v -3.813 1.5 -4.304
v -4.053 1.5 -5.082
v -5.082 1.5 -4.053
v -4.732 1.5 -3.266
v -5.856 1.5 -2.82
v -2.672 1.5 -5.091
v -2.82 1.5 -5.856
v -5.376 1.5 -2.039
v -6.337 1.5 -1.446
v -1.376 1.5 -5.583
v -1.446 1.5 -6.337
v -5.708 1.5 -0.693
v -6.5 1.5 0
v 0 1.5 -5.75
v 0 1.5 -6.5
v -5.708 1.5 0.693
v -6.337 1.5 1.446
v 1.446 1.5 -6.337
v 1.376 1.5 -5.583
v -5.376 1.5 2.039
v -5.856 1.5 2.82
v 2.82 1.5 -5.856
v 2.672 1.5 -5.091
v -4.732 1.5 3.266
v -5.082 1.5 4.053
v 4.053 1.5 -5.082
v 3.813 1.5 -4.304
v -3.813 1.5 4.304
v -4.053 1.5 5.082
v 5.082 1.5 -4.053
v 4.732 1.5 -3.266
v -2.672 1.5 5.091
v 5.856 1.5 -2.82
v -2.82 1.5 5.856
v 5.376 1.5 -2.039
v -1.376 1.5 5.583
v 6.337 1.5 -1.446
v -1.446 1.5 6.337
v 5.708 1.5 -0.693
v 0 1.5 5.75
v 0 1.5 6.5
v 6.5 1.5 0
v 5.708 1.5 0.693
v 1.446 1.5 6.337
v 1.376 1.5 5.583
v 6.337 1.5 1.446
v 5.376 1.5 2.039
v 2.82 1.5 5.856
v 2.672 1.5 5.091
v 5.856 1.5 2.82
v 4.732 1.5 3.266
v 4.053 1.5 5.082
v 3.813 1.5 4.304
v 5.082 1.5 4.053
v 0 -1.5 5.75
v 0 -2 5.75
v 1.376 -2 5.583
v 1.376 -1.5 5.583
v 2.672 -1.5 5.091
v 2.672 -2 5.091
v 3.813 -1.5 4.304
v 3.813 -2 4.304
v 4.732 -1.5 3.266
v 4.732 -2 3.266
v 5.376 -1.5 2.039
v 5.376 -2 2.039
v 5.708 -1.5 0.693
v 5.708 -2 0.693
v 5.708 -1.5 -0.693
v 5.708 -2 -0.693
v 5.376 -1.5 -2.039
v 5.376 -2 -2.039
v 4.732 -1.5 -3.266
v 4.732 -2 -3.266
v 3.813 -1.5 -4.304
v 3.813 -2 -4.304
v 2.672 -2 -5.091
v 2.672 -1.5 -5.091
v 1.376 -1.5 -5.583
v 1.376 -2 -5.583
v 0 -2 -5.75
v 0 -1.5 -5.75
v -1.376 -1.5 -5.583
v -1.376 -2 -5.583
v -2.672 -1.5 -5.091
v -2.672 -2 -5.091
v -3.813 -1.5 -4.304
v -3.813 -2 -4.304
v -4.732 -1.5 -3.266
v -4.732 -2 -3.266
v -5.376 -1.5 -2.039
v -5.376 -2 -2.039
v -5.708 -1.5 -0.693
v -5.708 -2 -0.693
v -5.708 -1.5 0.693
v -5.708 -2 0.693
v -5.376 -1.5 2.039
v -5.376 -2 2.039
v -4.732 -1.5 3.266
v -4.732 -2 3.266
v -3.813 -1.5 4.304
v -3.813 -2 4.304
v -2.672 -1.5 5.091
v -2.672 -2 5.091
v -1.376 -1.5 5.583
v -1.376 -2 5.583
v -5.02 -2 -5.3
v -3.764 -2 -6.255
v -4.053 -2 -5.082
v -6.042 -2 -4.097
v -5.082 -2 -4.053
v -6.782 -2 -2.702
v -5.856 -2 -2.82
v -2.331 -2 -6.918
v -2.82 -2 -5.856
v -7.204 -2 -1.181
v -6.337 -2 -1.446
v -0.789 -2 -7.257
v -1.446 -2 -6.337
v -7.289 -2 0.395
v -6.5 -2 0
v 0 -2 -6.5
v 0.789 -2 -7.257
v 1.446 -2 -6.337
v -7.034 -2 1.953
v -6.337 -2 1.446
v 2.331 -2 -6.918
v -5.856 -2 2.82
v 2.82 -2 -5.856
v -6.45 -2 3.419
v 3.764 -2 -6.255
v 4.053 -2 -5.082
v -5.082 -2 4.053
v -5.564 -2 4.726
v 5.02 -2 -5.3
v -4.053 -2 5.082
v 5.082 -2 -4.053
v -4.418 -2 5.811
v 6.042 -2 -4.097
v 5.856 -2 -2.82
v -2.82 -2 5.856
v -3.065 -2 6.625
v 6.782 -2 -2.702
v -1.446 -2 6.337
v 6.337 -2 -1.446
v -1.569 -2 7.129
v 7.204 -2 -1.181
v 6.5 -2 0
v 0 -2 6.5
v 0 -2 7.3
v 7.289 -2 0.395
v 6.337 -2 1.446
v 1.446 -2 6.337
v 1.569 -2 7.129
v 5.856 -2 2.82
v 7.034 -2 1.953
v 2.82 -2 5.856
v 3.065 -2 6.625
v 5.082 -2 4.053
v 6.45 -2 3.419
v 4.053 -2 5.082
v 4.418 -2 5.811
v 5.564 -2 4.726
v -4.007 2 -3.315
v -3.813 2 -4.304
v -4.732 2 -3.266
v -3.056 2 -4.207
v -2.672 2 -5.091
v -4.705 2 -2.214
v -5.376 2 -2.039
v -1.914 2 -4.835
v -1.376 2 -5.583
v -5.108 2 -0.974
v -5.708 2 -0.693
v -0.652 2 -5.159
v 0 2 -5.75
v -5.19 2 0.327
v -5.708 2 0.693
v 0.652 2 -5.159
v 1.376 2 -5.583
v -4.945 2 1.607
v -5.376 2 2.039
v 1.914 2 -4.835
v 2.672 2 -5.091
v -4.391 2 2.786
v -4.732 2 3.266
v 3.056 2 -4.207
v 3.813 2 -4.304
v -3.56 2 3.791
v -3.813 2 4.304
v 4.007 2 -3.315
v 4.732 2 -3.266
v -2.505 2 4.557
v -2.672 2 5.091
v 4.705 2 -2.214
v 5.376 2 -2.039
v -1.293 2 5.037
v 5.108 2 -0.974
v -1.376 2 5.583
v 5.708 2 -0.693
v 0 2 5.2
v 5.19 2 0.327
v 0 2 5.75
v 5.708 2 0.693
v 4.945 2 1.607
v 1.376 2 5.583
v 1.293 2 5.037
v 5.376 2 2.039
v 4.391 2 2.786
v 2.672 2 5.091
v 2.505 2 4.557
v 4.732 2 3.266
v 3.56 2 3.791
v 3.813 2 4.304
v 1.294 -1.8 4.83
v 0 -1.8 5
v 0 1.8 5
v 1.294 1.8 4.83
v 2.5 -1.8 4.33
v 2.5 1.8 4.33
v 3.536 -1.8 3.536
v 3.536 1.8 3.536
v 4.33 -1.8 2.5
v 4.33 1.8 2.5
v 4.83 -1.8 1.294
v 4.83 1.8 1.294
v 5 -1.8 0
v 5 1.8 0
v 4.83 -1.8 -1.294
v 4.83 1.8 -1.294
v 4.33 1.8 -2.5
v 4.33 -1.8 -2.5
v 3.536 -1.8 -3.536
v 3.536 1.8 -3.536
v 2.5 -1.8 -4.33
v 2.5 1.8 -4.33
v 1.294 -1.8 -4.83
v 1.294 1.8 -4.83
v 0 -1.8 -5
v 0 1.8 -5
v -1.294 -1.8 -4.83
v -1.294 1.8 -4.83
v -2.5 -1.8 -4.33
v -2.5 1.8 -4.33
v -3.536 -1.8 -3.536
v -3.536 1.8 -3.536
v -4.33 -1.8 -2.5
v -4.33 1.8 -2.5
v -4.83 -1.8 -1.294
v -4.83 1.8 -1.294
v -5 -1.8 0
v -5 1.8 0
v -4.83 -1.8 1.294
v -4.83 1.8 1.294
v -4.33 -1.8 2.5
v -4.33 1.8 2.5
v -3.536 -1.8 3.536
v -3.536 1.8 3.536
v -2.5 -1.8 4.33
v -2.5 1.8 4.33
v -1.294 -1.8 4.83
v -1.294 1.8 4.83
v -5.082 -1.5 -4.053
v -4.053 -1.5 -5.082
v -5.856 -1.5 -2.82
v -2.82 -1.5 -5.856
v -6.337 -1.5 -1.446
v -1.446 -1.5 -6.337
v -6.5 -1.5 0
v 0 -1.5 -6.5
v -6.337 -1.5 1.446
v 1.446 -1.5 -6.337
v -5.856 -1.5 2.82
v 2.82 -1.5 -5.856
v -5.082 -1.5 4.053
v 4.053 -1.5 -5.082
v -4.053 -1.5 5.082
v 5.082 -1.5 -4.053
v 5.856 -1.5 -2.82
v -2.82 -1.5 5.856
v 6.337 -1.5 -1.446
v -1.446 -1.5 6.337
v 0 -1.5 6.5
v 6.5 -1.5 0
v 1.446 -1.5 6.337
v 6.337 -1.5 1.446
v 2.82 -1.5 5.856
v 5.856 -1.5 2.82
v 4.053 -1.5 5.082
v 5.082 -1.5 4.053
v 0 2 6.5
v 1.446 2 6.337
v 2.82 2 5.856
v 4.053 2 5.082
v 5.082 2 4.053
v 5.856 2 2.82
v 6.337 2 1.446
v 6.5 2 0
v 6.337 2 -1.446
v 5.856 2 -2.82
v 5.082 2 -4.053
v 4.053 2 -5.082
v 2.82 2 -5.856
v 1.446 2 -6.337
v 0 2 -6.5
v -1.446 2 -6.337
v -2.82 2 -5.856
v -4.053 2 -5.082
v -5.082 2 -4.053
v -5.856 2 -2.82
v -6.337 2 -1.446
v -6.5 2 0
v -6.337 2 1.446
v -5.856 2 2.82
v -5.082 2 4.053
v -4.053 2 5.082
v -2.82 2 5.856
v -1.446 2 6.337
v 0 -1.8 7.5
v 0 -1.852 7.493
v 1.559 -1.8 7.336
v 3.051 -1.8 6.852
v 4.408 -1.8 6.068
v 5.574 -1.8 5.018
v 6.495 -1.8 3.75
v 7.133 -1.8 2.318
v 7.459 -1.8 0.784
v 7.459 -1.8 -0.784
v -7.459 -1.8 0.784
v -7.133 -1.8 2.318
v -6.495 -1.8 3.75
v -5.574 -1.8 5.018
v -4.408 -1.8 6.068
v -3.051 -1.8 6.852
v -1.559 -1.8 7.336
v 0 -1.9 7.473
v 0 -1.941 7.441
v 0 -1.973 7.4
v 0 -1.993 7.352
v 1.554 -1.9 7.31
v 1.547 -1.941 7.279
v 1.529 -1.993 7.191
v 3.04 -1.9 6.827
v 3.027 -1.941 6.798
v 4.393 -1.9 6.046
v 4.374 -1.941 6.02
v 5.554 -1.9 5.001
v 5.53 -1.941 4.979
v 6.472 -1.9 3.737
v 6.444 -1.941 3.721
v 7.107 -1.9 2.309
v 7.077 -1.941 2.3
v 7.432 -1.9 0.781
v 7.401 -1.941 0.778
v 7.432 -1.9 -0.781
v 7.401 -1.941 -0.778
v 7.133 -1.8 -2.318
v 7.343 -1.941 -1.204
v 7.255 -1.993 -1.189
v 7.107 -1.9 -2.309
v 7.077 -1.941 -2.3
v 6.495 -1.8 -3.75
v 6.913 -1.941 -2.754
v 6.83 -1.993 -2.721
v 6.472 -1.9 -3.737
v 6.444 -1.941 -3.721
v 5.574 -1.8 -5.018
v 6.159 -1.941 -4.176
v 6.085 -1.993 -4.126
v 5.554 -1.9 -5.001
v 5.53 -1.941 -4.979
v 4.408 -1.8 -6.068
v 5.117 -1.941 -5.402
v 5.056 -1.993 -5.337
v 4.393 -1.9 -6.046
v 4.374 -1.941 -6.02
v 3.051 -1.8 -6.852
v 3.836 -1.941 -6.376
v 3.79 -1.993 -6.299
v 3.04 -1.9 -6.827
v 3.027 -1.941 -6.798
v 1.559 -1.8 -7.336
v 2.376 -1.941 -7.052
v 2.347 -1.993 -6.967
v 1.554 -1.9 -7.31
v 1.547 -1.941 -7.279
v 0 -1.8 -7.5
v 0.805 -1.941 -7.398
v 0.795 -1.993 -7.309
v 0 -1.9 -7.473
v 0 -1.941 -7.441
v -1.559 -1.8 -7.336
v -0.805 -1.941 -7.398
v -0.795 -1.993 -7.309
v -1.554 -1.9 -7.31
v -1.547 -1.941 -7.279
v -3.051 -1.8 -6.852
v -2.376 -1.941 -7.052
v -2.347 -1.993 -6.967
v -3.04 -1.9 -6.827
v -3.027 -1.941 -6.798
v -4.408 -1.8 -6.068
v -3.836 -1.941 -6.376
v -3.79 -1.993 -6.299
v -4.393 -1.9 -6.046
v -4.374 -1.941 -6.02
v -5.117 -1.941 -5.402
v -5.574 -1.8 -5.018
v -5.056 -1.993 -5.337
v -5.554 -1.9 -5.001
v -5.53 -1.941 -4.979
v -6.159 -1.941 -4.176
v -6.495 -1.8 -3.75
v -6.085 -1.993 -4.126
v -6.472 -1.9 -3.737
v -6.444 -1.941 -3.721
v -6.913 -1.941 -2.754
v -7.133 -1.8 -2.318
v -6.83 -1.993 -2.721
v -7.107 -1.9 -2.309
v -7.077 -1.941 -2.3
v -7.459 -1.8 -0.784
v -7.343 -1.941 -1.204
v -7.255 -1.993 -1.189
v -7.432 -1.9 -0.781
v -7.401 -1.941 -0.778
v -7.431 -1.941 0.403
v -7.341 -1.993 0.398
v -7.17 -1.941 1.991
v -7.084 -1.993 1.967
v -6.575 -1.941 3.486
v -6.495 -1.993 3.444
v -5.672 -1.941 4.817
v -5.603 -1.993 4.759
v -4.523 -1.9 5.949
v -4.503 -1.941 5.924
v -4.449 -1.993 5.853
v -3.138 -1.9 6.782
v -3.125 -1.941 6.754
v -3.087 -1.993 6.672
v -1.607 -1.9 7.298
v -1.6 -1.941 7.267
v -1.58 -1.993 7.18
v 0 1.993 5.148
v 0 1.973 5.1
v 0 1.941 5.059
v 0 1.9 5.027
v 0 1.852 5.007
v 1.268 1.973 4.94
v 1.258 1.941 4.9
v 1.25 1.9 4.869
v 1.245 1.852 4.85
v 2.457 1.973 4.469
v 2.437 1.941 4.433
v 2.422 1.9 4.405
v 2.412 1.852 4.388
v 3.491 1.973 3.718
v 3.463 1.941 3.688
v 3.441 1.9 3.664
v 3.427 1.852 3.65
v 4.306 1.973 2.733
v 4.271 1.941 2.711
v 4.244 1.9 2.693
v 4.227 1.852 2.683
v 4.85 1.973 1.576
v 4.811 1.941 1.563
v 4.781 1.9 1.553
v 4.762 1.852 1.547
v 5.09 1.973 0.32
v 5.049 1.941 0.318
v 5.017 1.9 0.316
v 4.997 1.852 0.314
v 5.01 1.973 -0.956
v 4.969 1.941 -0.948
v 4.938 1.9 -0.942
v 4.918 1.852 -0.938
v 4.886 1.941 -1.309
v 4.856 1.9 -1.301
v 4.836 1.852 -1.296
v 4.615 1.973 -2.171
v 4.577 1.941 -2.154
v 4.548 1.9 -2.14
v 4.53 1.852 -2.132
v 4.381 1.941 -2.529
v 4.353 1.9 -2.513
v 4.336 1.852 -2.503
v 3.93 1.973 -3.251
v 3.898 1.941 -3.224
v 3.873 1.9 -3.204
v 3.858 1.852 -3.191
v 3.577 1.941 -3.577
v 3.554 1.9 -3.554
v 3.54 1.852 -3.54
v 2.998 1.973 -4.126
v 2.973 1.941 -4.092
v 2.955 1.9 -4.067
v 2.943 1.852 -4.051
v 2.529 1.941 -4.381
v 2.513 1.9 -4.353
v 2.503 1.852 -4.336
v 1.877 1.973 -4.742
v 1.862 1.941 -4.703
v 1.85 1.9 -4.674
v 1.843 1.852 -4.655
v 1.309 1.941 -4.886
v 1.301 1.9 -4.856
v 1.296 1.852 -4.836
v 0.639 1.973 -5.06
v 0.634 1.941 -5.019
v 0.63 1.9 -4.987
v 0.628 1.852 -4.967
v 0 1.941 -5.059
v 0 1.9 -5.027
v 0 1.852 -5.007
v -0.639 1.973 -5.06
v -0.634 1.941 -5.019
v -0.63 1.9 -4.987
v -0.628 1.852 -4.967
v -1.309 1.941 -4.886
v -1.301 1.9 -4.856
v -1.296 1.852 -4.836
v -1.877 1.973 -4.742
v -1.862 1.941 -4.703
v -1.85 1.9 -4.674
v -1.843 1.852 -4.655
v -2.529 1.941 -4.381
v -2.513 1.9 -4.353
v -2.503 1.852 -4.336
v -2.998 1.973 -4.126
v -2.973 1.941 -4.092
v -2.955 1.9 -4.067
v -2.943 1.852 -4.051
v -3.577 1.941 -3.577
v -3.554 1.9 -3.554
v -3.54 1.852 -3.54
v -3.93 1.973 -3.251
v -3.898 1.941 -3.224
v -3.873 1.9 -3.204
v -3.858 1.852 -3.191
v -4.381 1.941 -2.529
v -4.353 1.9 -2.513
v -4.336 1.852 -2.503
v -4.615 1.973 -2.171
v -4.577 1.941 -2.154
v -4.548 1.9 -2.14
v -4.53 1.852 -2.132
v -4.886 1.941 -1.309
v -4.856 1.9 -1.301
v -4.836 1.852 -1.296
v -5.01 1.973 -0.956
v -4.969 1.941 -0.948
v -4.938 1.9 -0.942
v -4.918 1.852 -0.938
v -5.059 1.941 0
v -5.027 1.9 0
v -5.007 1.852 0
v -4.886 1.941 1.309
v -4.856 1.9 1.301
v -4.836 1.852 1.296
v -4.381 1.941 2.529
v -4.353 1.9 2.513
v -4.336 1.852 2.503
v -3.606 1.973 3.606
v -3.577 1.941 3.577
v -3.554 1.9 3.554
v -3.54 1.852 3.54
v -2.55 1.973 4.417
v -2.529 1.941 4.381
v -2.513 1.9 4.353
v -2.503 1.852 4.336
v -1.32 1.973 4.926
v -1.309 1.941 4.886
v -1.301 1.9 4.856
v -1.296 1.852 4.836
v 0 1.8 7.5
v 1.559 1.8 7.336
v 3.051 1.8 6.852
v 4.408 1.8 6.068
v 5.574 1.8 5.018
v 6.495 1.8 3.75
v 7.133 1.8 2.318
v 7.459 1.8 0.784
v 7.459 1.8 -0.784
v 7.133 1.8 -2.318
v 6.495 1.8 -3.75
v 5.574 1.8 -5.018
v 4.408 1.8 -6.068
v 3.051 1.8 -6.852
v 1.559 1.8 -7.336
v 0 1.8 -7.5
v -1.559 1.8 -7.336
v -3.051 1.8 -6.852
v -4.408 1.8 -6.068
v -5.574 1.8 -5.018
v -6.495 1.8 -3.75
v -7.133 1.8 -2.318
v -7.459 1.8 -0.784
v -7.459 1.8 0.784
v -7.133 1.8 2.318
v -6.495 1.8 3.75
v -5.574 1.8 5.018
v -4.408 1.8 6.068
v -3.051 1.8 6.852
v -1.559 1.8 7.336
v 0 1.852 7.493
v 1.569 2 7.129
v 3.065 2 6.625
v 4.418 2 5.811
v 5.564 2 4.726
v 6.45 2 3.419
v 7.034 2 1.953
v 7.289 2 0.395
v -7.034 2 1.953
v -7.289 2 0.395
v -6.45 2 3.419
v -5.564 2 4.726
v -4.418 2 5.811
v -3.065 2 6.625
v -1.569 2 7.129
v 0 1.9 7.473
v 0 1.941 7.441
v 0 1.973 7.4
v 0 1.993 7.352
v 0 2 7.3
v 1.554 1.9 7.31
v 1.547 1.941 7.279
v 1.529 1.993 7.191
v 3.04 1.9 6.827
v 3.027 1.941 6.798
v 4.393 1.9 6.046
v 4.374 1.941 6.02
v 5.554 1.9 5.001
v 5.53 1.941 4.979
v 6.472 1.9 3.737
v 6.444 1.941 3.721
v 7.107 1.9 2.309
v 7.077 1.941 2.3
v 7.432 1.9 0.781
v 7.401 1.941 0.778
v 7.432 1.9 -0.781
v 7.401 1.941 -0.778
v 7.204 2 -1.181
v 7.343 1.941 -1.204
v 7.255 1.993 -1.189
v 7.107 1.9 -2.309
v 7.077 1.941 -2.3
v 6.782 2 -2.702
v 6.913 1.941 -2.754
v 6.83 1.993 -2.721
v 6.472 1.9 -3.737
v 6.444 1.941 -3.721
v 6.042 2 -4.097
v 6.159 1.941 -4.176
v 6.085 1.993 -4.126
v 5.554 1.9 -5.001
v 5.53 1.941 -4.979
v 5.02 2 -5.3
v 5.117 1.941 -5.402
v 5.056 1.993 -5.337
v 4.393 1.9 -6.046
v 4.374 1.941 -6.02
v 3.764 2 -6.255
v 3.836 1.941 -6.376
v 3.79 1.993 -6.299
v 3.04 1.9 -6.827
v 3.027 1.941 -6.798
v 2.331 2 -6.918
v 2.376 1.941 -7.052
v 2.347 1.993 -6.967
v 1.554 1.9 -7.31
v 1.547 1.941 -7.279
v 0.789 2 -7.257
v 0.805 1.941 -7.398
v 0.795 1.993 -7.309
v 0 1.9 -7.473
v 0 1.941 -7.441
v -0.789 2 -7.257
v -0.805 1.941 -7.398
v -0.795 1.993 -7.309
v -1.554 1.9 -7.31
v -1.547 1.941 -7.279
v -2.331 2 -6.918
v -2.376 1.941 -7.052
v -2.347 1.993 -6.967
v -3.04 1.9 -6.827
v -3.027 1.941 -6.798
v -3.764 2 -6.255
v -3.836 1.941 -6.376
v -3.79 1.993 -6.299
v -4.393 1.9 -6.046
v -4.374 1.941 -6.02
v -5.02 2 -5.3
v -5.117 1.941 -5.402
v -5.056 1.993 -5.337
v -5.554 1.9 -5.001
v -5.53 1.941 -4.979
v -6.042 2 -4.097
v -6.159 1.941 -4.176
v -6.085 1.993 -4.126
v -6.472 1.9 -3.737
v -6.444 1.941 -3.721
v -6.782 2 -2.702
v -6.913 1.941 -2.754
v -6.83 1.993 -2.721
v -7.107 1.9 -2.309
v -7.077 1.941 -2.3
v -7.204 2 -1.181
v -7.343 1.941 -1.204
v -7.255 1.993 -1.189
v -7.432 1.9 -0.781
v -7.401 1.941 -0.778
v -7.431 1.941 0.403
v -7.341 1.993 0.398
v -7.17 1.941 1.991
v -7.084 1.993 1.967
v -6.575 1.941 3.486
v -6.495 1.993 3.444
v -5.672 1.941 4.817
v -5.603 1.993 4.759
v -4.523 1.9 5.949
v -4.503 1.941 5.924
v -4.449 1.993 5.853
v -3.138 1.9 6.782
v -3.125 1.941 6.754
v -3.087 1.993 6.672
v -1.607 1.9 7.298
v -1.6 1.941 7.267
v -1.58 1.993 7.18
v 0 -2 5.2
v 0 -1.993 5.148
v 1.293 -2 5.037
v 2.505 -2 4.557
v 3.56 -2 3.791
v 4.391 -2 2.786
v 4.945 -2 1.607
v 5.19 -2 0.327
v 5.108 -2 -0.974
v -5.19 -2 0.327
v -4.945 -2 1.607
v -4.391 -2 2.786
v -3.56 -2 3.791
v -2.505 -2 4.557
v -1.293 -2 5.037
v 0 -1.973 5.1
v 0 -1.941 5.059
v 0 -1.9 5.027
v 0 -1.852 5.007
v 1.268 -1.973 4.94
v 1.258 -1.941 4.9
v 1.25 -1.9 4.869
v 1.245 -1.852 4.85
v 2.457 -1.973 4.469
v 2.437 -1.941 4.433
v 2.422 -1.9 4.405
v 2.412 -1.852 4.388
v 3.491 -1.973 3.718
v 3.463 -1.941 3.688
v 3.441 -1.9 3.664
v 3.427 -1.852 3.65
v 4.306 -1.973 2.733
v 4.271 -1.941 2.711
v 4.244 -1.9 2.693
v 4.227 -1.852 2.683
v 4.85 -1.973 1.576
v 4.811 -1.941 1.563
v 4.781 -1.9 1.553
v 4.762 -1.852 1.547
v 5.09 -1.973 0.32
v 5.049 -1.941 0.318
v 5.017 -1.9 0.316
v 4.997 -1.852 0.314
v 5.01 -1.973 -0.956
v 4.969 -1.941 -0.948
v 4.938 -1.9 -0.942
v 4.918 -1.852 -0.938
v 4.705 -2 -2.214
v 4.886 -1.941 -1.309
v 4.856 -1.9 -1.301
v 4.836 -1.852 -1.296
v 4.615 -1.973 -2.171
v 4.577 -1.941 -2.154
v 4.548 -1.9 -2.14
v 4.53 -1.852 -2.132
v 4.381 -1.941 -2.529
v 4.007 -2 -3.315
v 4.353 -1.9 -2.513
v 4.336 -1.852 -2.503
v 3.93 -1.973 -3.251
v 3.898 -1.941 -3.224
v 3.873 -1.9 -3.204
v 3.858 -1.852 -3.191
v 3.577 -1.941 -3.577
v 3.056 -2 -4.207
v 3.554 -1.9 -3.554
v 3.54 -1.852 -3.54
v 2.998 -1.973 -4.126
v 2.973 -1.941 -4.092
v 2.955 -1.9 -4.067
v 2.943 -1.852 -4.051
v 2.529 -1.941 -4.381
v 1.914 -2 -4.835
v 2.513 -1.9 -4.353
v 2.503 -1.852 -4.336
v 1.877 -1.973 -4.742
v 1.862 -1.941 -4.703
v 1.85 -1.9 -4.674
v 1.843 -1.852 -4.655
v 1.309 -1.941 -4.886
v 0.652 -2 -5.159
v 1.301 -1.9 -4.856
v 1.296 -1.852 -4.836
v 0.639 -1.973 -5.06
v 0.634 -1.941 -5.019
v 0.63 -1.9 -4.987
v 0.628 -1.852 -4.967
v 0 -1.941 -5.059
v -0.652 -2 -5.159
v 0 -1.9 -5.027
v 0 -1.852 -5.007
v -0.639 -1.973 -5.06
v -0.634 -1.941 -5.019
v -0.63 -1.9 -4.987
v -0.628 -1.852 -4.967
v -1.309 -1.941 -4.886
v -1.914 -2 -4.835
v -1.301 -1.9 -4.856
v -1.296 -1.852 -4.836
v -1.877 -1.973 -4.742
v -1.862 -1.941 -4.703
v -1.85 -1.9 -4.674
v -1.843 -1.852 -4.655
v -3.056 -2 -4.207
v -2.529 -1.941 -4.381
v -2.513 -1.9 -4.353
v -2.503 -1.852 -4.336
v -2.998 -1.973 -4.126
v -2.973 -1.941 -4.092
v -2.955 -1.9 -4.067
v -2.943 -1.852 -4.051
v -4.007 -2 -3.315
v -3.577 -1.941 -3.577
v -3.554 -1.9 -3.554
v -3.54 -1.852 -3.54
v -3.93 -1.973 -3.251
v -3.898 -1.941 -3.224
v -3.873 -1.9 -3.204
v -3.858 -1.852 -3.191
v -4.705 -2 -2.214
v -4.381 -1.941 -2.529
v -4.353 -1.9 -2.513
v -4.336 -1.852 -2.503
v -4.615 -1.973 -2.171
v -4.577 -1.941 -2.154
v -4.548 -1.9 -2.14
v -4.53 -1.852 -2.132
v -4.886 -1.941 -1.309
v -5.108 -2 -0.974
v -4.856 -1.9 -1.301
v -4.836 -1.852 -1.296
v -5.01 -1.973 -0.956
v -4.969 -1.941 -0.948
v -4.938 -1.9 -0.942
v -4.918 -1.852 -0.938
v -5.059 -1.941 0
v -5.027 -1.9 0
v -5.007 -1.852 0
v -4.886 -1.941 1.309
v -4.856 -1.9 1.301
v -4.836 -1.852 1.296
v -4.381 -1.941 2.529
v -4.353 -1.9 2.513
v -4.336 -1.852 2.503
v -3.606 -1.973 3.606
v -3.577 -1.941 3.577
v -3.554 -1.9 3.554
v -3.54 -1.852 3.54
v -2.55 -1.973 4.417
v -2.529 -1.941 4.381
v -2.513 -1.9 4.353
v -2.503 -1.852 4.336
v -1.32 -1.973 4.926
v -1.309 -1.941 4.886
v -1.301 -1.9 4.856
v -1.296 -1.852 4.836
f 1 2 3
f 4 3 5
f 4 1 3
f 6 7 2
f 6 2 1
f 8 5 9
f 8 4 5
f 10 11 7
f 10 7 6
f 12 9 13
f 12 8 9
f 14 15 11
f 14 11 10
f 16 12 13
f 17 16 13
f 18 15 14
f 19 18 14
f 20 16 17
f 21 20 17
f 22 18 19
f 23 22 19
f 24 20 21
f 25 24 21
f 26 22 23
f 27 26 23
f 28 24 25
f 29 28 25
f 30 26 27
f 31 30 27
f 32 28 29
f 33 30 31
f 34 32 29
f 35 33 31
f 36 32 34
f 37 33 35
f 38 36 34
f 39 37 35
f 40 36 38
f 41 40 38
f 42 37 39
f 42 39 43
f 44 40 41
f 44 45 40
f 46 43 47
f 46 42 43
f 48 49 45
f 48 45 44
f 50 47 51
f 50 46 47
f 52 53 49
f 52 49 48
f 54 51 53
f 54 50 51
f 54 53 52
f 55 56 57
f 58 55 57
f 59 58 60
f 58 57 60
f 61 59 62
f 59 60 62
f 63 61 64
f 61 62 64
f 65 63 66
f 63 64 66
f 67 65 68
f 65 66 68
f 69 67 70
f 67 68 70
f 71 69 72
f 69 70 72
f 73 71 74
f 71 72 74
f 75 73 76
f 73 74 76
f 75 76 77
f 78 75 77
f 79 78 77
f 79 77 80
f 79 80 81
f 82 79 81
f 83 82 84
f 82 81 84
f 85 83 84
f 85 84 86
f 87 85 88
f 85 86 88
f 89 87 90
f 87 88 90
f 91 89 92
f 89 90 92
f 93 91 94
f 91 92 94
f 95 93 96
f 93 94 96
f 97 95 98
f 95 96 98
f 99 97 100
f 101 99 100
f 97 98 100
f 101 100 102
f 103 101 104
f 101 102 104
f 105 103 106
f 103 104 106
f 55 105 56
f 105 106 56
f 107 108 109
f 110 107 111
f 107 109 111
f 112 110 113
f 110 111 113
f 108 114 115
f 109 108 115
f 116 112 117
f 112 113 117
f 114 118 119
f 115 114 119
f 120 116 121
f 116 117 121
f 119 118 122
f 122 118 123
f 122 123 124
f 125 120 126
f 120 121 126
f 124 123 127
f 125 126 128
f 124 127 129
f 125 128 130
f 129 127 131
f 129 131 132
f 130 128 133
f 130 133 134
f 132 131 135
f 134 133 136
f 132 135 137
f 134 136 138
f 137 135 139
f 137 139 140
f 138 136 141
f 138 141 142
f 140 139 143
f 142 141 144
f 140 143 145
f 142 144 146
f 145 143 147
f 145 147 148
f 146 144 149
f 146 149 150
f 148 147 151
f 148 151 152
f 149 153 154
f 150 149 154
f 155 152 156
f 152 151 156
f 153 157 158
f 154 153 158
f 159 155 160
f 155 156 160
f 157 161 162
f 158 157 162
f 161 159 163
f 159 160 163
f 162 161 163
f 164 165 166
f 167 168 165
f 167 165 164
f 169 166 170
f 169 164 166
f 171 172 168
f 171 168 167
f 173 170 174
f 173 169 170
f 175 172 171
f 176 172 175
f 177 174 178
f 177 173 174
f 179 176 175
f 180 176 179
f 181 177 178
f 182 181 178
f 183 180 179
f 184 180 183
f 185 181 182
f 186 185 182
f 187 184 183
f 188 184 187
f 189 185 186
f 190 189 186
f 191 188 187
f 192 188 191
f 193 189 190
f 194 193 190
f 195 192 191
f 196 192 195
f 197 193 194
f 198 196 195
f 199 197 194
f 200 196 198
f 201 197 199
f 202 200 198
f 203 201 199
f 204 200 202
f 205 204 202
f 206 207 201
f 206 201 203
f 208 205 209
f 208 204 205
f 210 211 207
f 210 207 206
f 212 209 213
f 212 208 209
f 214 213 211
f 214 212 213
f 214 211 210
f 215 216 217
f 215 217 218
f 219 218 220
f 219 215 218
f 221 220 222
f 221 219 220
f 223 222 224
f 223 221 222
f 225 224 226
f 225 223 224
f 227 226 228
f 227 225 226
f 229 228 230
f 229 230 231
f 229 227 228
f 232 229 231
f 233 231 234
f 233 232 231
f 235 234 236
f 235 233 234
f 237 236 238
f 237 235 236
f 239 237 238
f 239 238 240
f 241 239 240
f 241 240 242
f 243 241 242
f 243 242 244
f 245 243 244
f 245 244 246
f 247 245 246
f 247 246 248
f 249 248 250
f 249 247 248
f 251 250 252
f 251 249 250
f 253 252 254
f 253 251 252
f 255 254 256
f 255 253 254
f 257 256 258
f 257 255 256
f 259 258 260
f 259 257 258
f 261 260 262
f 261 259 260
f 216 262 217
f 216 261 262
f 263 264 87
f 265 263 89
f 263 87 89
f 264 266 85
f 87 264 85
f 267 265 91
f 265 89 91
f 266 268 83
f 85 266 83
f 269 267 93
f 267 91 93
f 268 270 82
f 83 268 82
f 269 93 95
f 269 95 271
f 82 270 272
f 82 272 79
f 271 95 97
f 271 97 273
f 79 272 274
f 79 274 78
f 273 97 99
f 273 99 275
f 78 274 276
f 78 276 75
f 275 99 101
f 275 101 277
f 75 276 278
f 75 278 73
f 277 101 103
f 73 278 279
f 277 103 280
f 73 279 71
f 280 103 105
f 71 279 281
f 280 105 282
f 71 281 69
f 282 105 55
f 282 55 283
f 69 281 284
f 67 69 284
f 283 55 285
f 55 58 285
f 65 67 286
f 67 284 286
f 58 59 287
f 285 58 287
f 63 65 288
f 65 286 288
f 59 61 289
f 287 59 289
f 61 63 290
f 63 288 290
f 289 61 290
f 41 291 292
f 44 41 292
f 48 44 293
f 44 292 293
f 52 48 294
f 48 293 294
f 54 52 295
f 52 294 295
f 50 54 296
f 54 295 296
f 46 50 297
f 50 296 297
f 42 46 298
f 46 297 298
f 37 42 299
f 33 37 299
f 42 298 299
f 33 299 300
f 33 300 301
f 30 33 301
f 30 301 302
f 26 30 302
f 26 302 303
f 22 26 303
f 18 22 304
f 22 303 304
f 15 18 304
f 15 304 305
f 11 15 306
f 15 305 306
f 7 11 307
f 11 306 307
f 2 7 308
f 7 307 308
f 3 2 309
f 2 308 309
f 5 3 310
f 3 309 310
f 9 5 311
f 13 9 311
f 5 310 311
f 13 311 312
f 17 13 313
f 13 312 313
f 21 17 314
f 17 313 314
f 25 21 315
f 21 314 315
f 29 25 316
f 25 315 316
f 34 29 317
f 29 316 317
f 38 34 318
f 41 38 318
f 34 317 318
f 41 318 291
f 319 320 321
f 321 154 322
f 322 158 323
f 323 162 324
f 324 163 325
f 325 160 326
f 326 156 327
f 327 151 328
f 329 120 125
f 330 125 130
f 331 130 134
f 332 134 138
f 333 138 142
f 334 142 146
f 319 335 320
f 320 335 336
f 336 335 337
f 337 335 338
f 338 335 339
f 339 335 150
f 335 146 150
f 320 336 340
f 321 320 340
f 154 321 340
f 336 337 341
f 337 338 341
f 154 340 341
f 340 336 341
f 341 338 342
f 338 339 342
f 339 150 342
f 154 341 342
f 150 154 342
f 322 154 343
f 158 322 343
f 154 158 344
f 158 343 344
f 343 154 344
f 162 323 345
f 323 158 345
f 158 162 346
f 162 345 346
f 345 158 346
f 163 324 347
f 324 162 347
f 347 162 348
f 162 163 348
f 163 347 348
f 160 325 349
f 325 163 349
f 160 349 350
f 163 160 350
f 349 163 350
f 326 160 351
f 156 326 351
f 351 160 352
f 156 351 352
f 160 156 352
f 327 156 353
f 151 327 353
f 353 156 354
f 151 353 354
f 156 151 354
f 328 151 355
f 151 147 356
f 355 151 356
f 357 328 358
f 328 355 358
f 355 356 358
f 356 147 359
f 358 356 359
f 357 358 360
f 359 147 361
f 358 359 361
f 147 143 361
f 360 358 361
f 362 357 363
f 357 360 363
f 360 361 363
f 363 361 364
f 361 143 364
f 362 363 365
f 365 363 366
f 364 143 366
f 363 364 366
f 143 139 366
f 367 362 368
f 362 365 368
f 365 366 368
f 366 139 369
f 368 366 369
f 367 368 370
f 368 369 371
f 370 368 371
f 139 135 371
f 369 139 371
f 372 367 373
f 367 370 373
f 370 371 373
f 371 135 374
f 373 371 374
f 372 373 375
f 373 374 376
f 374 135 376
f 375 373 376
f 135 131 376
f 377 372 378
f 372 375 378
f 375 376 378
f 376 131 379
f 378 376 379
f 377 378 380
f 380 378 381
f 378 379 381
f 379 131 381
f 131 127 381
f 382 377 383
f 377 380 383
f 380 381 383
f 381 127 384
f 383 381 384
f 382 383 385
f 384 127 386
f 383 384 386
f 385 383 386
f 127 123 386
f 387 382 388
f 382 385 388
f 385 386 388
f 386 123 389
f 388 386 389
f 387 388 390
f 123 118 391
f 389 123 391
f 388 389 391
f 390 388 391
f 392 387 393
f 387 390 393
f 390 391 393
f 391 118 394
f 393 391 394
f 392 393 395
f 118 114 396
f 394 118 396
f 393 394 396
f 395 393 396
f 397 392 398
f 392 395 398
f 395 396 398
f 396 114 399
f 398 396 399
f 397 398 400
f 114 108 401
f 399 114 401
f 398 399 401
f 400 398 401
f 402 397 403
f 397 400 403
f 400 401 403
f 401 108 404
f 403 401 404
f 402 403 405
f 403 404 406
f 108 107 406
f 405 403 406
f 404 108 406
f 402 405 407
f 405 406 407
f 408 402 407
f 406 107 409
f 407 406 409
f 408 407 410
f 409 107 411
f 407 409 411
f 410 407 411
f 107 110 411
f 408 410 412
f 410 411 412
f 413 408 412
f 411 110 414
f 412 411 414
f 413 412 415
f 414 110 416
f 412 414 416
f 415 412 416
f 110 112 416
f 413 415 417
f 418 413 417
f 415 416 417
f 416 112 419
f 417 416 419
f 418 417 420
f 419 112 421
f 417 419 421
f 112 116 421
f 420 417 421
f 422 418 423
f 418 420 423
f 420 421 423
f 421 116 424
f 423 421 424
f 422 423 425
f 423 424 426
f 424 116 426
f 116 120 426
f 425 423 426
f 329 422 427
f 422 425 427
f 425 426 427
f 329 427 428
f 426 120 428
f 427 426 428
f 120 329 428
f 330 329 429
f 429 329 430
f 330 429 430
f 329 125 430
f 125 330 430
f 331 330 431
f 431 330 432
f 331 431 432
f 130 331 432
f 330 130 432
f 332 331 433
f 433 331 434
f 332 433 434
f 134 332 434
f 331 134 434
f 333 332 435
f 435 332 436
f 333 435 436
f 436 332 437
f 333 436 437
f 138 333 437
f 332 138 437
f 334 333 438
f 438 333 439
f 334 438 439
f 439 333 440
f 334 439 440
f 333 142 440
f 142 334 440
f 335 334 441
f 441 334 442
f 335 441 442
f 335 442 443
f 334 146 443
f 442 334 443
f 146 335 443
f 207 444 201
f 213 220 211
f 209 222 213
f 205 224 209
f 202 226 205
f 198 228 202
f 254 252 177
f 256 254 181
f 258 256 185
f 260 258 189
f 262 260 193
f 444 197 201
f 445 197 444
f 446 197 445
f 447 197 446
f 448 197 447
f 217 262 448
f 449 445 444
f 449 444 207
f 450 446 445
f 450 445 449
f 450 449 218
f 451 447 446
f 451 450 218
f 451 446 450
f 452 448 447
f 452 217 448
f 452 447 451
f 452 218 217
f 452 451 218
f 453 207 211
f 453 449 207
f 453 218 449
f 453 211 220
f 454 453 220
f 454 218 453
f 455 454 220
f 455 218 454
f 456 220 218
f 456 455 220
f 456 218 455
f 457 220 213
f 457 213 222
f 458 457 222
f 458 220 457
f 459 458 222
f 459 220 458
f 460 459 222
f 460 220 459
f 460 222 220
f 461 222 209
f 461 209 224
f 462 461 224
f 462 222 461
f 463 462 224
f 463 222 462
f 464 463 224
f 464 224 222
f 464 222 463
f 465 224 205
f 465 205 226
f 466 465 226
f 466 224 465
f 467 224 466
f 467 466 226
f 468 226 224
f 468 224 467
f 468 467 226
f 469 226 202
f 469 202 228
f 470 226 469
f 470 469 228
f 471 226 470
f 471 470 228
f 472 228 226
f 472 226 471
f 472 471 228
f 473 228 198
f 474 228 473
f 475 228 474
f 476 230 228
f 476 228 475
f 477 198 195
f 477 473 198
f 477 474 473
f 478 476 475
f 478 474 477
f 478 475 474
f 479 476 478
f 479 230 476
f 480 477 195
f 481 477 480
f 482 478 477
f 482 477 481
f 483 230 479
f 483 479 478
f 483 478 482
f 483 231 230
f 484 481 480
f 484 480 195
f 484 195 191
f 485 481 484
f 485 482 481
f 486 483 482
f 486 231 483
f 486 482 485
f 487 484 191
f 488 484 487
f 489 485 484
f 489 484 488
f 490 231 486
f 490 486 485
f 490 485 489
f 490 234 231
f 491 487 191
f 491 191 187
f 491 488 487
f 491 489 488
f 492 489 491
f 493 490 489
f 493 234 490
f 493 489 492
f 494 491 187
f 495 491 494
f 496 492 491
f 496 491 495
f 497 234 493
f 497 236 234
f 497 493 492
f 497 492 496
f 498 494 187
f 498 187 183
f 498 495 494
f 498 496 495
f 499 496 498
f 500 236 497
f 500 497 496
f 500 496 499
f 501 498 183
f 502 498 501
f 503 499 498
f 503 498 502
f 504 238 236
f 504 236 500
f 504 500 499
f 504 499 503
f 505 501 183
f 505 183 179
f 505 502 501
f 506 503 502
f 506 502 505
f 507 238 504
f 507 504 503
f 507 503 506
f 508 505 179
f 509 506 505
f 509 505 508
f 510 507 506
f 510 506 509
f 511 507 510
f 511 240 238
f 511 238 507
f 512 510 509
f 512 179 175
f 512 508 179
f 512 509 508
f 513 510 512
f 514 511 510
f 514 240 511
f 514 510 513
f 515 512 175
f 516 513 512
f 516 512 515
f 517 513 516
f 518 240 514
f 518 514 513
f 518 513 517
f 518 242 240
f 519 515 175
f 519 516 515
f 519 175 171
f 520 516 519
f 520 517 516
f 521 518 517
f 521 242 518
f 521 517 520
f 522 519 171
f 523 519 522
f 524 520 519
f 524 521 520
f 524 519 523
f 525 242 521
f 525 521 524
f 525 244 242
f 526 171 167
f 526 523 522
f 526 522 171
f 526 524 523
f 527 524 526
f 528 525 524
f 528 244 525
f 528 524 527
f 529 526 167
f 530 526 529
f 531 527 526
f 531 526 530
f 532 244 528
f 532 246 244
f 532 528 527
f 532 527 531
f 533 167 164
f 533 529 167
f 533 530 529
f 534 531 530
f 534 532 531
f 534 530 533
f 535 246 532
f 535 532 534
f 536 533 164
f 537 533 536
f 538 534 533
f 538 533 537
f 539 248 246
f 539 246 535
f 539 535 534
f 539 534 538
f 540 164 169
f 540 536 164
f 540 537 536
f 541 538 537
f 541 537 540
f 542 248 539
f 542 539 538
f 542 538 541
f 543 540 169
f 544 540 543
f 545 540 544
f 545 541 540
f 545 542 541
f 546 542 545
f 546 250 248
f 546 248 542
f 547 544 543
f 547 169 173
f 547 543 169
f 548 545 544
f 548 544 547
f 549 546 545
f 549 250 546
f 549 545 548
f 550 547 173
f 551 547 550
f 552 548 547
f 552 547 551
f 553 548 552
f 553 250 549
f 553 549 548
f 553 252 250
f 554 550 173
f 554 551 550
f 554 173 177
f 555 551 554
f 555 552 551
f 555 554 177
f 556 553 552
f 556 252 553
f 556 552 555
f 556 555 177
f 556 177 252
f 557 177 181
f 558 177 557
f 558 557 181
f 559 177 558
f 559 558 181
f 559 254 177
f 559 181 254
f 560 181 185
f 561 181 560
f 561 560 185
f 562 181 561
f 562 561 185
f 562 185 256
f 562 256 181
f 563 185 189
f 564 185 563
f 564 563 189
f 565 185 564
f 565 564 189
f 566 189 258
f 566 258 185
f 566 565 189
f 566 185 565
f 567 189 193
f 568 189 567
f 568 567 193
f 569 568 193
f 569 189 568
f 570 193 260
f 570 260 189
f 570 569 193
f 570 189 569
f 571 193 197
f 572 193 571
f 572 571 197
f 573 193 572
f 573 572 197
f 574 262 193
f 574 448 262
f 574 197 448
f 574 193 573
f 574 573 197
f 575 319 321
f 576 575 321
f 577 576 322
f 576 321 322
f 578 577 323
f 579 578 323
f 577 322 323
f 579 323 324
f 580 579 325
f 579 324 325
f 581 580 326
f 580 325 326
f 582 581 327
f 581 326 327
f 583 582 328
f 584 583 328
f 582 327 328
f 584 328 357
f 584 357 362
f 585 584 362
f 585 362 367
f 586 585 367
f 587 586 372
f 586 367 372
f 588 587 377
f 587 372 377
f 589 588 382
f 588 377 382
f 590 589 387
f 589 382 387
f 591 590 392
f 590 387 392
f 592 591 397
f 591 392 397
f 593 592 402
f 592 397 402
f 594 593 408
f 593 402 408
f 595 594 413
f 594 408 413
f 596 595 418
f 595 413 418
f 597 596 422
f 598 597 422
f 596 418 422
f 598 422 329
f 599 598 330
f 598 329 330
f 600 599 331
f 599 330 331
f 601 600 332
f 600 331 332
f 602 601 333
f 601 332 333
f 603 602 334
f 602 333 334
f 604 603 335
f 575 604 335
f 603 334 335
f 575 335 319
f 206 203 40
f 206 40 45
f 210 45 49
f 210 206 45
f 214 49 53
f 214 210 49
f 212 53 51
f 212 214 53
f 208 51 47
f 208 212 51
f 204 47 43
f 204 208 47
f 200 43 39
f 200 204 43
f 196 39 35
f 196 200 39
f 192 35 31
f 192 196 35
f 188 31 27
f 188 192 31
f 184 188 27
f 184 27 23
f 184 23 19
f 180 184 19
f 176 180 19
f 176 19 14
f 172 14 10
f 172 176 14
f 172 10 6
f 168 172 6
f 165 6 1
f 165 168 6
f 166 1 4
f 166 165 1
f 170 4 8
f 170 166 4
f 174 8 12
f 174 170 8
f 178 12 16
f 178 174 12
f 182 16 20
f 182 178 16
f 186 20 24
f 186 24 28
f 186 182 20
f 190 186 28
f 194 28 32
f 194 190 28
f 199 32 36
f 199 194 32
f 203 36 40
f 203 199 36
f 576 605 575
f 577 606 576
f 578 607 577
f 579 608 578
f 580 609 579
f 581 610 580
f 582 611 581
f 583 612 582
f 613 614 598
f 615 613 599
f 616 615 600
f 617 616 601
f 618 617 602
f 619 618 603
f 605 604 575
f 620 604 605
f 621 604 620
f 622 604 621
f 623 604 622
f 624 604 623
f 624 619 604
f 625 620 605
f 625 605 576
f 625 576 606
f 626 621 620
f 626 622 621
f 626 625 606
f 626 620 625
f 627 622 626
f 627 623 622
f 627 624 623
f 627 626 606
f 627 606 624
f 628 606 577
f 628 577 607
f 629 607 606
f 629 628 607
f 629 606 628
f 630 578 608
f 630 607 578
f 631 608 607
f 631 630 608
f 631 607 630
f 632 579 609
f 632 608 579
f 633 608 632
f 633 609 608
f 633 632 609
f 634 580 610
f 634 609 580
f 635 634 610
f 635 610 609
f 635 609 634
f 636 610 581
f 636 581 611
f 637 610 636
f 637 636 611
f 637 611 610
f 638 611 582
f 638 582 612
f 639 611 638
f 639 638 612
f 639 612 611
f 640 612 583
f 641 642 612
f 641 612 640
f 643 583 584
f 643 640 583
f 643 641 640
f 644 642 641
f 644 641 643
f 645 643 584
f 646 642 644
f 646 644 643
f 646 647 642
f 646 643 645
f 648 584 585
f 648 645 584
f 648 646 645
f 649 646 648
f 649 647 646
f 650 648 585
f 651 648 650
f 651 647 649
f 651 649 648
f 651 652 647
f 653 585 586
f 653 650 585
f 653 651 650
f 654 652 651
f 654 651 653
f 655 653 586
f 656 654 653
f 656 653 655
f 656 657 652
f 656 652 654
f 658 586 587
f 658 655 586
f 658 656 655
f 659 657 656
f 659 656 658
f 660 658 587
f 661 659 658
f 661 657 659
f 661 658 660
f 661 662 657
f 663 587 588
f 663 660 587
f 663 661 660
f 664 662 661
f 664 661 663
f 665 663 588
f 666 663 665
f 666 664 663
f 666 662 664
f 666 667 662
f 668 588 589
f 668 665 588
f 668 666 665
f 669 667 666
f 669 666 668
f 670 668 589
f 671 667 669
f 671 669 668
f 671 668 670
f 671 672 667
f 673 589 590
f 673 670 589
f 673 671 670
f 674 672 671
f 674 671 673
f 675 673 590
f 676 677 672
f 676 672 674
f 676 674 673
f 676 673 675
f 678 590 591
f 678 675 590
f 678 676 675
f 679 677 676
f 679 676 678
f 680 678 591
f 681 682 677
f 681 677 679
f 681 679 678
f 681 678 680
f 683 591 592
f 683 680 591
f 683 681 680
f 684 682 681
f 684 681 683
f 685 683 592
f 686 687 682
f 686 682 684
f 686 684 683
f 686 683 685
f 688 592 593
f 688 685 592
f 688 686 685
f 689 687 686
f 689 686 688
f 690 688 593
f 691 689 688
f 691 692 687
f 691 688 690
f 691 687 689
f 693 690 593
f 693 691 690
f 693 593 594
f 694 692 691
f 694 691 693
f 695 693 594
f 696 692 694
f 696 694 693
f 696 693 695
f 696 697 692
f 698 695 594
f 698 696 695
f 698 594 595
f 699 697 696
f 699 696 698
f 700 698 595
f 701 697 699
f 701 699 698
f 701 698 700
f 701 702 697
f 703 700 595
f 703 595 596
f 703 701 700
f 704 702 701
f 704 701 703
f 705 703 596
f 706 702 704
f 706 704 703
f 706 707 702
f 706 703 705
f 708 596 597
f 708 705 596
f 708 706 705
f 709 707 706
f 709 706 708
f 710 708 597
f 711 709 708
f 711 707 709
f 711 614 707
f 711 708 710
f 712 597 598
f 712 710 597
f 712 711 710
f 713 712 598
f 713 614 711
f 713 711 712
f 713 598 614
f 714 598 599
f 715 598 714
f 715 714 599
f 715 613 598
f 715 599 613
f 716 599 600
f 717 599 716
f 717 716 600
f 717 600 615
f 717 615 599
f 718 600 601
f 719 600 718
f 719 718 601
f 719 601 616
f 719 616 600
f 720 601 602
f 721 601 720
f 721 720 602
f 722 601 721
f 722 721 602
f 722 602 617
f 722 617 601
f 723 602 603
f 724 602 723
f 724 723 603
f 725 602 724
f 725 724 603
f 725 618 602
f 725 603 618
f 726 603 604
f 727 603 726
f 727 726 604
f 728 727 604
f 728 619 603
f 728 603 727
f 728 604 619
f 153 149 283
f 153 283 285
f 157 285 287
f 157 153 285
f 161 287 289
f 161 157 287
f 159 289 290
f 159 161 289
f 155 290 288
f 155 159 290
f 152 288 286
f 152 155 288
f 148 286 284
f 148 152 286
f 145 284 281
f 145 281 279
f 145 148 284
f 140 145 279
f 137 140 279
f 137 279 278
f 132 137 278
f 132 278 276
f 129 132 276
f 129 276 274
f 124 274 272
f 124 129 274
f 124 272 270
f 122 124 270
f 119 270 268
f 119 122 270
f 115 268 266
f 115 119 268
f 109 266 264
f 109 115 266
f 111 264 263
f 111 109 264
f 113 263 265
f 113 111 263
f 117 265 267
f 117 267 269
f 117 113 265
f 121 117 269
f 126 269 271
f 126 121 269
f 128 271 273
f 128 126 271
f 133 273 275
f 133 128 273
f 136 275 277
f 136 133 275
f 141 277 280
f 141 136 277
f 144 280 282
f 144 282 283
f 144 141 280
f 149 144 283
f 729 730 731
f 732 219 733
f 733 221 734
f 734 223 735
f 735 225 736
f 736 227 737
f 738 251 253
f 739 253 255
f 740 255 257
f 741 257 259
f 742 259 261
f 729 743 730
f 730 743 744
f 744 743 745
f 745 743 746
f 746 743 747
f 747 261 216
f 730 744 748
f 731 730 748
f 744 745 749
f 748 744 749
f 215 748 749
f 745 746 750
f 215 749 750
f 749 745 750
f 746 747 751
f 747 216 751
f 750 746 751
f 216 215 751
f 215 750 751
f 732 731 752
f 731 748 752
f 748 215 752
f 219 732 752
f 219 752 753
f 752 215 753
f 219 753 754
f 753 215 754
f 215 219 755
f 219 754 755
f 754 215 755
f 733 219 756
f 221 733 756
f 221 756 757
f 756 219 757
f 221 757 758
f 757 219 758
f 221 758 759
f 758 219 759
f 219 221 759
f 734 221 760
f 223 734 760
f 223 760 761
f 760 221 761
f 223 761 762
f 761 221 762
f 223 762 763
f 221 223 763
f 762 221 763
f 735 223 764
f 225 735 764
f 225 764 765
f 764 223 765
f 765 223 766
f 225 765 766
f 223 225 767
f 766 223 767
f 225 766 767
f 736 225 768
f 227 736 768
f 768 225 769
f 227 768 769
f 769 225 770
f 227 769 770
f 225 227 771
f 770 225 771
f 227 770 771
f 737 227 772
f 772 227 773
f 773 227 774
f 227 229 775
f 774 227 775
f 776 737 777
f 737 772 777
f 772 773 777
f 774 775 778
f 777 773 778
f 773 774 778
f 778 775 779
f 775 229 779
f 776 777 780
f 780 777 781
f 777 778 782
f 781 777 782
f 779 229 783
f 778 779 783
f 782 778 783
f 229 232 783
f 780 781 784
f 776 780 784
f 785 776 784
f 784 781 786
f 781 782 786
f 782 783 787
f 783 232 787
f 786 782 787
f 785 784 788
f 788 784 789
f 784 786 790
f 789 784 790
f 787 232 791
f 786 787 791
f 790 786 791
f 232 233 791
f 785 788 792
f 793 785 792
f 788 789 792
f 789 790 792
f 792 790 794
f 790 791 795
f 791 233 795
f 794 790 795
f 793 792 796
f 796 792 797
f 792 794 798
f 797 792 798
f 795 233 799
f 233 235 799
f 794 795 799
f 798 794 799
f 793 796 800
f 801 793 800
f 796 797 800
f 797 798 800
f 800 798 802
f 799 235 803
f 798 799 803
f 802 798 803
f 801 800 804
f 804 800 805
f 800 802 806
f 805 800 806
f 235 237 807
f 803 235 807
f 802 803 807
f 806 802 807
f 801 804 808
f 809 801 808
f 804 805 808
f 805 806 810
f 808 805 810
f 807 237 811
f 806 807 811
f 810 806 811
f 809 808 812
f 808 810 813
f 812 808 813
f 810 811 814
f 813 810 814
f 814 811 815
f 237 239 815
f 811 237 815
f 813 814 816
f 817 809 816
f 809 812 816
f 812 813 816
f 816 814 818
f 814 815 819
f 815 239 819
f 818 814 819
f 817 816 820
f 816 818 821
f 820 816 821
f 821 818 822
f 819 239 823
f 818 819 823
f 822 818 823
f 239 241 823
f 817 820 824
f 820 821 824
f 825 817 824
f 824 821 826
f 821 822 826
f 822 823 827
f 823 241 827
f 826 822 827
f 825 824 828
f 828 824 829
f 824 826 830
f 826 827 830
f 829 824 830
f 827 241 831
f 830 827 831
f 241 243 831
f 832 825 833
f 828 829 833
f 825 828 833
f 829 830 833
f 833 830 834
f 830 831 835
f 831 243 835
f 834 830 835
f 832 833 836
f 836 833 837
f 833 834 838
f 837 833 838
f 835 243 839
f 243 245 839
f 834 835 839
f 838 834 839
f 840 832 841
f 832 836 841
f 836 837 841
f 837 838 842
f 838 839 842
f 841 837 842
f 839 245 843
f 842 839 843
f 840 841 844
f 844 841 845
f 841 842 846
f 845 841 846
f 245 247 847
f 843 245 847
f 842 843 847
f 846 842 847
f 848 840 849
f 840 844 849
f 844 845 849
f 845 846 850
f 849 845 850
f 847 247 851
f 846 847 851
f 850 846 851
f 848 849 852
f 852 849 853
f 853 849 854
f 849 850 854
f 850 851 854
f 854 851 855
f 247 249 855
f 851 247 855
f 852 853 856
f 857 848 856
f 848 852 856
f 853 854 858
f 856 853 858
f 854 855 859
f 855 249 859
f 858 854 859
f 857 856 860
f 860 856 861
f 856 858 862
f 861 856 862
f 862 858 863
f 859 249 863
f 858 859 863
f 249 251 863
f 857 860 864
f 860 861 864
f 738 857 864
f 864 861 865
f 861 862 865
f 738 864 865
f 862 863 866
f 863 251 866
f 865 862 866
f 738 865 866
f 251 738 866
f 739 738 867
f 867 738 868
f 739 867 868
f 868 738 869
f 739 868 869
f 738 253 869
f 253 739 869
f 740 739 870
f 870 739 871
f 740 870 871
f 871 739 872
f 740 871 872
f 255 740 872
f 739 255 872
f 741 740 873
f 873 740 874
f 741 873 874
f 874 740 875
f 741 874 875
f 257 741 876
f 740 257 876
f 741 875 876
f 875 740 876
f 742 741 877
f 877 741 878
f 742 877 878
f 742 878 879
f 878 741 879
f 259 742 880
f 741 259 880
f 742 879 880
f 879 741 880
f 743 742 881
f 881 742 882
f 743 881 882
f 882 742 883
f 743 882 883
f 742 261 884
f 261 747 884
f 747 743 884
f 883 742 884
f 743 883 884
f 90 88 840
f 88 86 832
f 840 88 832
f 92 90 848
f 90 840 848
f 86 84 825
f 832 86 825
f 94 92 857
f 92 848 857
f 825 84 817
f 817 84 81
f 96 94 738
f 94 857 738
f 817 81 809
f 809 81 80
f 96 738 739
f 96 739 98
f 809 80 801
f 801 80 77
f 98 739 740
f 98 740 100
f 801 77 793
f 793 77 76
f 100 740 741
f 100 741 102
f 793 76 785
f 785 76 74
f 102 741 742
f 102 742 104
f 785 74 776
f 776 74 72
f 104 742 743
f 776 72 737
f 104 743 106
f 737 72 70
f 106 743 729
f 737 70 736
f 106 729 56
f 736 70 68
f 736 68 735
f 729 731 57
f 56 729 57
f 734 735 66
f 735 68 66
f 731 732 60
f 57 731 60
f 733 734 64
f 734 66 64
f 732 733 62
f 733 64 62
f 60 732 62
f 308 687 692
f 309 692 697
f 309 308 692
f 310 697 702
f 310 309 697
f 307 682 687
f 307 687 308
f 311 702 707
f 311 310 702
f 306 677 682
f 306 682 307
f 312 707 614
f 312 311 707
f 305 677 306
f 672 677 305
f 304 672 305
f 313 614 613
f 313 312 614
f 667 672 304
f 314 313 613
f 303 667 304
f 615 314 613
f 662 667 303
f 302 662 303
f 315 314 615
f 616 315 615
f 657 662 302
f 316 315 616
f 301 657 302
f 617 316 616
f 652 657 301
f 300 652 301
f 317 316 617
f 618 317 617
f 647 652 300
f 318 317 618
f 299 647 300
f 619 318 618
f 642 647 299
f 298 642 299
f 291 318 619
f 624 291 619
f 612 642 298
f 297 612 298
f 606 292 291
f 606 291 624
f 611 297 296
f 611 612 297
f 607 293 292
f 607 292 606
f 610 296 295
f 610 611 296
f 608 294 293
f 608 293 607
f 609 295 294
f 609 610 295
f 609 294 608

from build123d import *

# Parameters (mm, degrees)
BOSS_EXTRUDE1_DEPTH      = 2
BOSS_EXTRUDE1_DEPTH_BACK = 2
SKETCH1_R                = 7.5
SKETCH1_R_2              = 5
SKETCH2_R                = 6.5
SKETCH2_R_2              = 5.75
CUT_EXTRUDE1_DEPTH       = 0.5
FILLET1_R                = 0.2


with BuildPart() as part:
    # Sketch1 → Boss-Extrude1 (new, two sides: drawn at the far end of the back side and taken through both)
    with BuildSketch(Plane(origin=(0, 0, 0), x_dir=(1, 0, 0), z_dir=(0, 1, 0)).offset(-BOSS_EXTRUDE1_DEPTH_BACK)):
        Circle(SKETCH1_R)
        Circle(SKETCH1_R_2, mode=Mode.SUBTRACT)
    extrude(amount=BOSS_EXTRUDE1_DEPTH + BOSS_EXTRUDE1_DEPTH_BACK)

    # Sketch2 → Cut-Extrude1 (cut)
    with BuildSketch(Plane(origin=(0, 2, 0), x_dir=(1, 0, 0), z_dir=(0, 1, 0))):
        Circle(SKETCH2_R)
        Circle(SKETCH2_R_2, mode=Mode.SUBTRACT)
    cut_extrude1 = extrude(amount=-CUT_EXTRUDE1_DEPTH, mode=Mode.SUBTRACT)

    # Mirror2: Cut-Extrude1 across plane
    add(cut_extrude1.mirror(Plane.ZX), mode=Mode.SUBTRACT)

    # Fillet1
    fillet1_edges = [part.edges().sort_by_distance(p)[0] for p in [
        (-5, -2, 0),
        (-5, 2, 0),
        (-7.5, 2, 0),
        (-7.5, -2, 0),
    ]]
    fillet(fillet1_edges, radius=FILLET1_R)


solid = part.part
